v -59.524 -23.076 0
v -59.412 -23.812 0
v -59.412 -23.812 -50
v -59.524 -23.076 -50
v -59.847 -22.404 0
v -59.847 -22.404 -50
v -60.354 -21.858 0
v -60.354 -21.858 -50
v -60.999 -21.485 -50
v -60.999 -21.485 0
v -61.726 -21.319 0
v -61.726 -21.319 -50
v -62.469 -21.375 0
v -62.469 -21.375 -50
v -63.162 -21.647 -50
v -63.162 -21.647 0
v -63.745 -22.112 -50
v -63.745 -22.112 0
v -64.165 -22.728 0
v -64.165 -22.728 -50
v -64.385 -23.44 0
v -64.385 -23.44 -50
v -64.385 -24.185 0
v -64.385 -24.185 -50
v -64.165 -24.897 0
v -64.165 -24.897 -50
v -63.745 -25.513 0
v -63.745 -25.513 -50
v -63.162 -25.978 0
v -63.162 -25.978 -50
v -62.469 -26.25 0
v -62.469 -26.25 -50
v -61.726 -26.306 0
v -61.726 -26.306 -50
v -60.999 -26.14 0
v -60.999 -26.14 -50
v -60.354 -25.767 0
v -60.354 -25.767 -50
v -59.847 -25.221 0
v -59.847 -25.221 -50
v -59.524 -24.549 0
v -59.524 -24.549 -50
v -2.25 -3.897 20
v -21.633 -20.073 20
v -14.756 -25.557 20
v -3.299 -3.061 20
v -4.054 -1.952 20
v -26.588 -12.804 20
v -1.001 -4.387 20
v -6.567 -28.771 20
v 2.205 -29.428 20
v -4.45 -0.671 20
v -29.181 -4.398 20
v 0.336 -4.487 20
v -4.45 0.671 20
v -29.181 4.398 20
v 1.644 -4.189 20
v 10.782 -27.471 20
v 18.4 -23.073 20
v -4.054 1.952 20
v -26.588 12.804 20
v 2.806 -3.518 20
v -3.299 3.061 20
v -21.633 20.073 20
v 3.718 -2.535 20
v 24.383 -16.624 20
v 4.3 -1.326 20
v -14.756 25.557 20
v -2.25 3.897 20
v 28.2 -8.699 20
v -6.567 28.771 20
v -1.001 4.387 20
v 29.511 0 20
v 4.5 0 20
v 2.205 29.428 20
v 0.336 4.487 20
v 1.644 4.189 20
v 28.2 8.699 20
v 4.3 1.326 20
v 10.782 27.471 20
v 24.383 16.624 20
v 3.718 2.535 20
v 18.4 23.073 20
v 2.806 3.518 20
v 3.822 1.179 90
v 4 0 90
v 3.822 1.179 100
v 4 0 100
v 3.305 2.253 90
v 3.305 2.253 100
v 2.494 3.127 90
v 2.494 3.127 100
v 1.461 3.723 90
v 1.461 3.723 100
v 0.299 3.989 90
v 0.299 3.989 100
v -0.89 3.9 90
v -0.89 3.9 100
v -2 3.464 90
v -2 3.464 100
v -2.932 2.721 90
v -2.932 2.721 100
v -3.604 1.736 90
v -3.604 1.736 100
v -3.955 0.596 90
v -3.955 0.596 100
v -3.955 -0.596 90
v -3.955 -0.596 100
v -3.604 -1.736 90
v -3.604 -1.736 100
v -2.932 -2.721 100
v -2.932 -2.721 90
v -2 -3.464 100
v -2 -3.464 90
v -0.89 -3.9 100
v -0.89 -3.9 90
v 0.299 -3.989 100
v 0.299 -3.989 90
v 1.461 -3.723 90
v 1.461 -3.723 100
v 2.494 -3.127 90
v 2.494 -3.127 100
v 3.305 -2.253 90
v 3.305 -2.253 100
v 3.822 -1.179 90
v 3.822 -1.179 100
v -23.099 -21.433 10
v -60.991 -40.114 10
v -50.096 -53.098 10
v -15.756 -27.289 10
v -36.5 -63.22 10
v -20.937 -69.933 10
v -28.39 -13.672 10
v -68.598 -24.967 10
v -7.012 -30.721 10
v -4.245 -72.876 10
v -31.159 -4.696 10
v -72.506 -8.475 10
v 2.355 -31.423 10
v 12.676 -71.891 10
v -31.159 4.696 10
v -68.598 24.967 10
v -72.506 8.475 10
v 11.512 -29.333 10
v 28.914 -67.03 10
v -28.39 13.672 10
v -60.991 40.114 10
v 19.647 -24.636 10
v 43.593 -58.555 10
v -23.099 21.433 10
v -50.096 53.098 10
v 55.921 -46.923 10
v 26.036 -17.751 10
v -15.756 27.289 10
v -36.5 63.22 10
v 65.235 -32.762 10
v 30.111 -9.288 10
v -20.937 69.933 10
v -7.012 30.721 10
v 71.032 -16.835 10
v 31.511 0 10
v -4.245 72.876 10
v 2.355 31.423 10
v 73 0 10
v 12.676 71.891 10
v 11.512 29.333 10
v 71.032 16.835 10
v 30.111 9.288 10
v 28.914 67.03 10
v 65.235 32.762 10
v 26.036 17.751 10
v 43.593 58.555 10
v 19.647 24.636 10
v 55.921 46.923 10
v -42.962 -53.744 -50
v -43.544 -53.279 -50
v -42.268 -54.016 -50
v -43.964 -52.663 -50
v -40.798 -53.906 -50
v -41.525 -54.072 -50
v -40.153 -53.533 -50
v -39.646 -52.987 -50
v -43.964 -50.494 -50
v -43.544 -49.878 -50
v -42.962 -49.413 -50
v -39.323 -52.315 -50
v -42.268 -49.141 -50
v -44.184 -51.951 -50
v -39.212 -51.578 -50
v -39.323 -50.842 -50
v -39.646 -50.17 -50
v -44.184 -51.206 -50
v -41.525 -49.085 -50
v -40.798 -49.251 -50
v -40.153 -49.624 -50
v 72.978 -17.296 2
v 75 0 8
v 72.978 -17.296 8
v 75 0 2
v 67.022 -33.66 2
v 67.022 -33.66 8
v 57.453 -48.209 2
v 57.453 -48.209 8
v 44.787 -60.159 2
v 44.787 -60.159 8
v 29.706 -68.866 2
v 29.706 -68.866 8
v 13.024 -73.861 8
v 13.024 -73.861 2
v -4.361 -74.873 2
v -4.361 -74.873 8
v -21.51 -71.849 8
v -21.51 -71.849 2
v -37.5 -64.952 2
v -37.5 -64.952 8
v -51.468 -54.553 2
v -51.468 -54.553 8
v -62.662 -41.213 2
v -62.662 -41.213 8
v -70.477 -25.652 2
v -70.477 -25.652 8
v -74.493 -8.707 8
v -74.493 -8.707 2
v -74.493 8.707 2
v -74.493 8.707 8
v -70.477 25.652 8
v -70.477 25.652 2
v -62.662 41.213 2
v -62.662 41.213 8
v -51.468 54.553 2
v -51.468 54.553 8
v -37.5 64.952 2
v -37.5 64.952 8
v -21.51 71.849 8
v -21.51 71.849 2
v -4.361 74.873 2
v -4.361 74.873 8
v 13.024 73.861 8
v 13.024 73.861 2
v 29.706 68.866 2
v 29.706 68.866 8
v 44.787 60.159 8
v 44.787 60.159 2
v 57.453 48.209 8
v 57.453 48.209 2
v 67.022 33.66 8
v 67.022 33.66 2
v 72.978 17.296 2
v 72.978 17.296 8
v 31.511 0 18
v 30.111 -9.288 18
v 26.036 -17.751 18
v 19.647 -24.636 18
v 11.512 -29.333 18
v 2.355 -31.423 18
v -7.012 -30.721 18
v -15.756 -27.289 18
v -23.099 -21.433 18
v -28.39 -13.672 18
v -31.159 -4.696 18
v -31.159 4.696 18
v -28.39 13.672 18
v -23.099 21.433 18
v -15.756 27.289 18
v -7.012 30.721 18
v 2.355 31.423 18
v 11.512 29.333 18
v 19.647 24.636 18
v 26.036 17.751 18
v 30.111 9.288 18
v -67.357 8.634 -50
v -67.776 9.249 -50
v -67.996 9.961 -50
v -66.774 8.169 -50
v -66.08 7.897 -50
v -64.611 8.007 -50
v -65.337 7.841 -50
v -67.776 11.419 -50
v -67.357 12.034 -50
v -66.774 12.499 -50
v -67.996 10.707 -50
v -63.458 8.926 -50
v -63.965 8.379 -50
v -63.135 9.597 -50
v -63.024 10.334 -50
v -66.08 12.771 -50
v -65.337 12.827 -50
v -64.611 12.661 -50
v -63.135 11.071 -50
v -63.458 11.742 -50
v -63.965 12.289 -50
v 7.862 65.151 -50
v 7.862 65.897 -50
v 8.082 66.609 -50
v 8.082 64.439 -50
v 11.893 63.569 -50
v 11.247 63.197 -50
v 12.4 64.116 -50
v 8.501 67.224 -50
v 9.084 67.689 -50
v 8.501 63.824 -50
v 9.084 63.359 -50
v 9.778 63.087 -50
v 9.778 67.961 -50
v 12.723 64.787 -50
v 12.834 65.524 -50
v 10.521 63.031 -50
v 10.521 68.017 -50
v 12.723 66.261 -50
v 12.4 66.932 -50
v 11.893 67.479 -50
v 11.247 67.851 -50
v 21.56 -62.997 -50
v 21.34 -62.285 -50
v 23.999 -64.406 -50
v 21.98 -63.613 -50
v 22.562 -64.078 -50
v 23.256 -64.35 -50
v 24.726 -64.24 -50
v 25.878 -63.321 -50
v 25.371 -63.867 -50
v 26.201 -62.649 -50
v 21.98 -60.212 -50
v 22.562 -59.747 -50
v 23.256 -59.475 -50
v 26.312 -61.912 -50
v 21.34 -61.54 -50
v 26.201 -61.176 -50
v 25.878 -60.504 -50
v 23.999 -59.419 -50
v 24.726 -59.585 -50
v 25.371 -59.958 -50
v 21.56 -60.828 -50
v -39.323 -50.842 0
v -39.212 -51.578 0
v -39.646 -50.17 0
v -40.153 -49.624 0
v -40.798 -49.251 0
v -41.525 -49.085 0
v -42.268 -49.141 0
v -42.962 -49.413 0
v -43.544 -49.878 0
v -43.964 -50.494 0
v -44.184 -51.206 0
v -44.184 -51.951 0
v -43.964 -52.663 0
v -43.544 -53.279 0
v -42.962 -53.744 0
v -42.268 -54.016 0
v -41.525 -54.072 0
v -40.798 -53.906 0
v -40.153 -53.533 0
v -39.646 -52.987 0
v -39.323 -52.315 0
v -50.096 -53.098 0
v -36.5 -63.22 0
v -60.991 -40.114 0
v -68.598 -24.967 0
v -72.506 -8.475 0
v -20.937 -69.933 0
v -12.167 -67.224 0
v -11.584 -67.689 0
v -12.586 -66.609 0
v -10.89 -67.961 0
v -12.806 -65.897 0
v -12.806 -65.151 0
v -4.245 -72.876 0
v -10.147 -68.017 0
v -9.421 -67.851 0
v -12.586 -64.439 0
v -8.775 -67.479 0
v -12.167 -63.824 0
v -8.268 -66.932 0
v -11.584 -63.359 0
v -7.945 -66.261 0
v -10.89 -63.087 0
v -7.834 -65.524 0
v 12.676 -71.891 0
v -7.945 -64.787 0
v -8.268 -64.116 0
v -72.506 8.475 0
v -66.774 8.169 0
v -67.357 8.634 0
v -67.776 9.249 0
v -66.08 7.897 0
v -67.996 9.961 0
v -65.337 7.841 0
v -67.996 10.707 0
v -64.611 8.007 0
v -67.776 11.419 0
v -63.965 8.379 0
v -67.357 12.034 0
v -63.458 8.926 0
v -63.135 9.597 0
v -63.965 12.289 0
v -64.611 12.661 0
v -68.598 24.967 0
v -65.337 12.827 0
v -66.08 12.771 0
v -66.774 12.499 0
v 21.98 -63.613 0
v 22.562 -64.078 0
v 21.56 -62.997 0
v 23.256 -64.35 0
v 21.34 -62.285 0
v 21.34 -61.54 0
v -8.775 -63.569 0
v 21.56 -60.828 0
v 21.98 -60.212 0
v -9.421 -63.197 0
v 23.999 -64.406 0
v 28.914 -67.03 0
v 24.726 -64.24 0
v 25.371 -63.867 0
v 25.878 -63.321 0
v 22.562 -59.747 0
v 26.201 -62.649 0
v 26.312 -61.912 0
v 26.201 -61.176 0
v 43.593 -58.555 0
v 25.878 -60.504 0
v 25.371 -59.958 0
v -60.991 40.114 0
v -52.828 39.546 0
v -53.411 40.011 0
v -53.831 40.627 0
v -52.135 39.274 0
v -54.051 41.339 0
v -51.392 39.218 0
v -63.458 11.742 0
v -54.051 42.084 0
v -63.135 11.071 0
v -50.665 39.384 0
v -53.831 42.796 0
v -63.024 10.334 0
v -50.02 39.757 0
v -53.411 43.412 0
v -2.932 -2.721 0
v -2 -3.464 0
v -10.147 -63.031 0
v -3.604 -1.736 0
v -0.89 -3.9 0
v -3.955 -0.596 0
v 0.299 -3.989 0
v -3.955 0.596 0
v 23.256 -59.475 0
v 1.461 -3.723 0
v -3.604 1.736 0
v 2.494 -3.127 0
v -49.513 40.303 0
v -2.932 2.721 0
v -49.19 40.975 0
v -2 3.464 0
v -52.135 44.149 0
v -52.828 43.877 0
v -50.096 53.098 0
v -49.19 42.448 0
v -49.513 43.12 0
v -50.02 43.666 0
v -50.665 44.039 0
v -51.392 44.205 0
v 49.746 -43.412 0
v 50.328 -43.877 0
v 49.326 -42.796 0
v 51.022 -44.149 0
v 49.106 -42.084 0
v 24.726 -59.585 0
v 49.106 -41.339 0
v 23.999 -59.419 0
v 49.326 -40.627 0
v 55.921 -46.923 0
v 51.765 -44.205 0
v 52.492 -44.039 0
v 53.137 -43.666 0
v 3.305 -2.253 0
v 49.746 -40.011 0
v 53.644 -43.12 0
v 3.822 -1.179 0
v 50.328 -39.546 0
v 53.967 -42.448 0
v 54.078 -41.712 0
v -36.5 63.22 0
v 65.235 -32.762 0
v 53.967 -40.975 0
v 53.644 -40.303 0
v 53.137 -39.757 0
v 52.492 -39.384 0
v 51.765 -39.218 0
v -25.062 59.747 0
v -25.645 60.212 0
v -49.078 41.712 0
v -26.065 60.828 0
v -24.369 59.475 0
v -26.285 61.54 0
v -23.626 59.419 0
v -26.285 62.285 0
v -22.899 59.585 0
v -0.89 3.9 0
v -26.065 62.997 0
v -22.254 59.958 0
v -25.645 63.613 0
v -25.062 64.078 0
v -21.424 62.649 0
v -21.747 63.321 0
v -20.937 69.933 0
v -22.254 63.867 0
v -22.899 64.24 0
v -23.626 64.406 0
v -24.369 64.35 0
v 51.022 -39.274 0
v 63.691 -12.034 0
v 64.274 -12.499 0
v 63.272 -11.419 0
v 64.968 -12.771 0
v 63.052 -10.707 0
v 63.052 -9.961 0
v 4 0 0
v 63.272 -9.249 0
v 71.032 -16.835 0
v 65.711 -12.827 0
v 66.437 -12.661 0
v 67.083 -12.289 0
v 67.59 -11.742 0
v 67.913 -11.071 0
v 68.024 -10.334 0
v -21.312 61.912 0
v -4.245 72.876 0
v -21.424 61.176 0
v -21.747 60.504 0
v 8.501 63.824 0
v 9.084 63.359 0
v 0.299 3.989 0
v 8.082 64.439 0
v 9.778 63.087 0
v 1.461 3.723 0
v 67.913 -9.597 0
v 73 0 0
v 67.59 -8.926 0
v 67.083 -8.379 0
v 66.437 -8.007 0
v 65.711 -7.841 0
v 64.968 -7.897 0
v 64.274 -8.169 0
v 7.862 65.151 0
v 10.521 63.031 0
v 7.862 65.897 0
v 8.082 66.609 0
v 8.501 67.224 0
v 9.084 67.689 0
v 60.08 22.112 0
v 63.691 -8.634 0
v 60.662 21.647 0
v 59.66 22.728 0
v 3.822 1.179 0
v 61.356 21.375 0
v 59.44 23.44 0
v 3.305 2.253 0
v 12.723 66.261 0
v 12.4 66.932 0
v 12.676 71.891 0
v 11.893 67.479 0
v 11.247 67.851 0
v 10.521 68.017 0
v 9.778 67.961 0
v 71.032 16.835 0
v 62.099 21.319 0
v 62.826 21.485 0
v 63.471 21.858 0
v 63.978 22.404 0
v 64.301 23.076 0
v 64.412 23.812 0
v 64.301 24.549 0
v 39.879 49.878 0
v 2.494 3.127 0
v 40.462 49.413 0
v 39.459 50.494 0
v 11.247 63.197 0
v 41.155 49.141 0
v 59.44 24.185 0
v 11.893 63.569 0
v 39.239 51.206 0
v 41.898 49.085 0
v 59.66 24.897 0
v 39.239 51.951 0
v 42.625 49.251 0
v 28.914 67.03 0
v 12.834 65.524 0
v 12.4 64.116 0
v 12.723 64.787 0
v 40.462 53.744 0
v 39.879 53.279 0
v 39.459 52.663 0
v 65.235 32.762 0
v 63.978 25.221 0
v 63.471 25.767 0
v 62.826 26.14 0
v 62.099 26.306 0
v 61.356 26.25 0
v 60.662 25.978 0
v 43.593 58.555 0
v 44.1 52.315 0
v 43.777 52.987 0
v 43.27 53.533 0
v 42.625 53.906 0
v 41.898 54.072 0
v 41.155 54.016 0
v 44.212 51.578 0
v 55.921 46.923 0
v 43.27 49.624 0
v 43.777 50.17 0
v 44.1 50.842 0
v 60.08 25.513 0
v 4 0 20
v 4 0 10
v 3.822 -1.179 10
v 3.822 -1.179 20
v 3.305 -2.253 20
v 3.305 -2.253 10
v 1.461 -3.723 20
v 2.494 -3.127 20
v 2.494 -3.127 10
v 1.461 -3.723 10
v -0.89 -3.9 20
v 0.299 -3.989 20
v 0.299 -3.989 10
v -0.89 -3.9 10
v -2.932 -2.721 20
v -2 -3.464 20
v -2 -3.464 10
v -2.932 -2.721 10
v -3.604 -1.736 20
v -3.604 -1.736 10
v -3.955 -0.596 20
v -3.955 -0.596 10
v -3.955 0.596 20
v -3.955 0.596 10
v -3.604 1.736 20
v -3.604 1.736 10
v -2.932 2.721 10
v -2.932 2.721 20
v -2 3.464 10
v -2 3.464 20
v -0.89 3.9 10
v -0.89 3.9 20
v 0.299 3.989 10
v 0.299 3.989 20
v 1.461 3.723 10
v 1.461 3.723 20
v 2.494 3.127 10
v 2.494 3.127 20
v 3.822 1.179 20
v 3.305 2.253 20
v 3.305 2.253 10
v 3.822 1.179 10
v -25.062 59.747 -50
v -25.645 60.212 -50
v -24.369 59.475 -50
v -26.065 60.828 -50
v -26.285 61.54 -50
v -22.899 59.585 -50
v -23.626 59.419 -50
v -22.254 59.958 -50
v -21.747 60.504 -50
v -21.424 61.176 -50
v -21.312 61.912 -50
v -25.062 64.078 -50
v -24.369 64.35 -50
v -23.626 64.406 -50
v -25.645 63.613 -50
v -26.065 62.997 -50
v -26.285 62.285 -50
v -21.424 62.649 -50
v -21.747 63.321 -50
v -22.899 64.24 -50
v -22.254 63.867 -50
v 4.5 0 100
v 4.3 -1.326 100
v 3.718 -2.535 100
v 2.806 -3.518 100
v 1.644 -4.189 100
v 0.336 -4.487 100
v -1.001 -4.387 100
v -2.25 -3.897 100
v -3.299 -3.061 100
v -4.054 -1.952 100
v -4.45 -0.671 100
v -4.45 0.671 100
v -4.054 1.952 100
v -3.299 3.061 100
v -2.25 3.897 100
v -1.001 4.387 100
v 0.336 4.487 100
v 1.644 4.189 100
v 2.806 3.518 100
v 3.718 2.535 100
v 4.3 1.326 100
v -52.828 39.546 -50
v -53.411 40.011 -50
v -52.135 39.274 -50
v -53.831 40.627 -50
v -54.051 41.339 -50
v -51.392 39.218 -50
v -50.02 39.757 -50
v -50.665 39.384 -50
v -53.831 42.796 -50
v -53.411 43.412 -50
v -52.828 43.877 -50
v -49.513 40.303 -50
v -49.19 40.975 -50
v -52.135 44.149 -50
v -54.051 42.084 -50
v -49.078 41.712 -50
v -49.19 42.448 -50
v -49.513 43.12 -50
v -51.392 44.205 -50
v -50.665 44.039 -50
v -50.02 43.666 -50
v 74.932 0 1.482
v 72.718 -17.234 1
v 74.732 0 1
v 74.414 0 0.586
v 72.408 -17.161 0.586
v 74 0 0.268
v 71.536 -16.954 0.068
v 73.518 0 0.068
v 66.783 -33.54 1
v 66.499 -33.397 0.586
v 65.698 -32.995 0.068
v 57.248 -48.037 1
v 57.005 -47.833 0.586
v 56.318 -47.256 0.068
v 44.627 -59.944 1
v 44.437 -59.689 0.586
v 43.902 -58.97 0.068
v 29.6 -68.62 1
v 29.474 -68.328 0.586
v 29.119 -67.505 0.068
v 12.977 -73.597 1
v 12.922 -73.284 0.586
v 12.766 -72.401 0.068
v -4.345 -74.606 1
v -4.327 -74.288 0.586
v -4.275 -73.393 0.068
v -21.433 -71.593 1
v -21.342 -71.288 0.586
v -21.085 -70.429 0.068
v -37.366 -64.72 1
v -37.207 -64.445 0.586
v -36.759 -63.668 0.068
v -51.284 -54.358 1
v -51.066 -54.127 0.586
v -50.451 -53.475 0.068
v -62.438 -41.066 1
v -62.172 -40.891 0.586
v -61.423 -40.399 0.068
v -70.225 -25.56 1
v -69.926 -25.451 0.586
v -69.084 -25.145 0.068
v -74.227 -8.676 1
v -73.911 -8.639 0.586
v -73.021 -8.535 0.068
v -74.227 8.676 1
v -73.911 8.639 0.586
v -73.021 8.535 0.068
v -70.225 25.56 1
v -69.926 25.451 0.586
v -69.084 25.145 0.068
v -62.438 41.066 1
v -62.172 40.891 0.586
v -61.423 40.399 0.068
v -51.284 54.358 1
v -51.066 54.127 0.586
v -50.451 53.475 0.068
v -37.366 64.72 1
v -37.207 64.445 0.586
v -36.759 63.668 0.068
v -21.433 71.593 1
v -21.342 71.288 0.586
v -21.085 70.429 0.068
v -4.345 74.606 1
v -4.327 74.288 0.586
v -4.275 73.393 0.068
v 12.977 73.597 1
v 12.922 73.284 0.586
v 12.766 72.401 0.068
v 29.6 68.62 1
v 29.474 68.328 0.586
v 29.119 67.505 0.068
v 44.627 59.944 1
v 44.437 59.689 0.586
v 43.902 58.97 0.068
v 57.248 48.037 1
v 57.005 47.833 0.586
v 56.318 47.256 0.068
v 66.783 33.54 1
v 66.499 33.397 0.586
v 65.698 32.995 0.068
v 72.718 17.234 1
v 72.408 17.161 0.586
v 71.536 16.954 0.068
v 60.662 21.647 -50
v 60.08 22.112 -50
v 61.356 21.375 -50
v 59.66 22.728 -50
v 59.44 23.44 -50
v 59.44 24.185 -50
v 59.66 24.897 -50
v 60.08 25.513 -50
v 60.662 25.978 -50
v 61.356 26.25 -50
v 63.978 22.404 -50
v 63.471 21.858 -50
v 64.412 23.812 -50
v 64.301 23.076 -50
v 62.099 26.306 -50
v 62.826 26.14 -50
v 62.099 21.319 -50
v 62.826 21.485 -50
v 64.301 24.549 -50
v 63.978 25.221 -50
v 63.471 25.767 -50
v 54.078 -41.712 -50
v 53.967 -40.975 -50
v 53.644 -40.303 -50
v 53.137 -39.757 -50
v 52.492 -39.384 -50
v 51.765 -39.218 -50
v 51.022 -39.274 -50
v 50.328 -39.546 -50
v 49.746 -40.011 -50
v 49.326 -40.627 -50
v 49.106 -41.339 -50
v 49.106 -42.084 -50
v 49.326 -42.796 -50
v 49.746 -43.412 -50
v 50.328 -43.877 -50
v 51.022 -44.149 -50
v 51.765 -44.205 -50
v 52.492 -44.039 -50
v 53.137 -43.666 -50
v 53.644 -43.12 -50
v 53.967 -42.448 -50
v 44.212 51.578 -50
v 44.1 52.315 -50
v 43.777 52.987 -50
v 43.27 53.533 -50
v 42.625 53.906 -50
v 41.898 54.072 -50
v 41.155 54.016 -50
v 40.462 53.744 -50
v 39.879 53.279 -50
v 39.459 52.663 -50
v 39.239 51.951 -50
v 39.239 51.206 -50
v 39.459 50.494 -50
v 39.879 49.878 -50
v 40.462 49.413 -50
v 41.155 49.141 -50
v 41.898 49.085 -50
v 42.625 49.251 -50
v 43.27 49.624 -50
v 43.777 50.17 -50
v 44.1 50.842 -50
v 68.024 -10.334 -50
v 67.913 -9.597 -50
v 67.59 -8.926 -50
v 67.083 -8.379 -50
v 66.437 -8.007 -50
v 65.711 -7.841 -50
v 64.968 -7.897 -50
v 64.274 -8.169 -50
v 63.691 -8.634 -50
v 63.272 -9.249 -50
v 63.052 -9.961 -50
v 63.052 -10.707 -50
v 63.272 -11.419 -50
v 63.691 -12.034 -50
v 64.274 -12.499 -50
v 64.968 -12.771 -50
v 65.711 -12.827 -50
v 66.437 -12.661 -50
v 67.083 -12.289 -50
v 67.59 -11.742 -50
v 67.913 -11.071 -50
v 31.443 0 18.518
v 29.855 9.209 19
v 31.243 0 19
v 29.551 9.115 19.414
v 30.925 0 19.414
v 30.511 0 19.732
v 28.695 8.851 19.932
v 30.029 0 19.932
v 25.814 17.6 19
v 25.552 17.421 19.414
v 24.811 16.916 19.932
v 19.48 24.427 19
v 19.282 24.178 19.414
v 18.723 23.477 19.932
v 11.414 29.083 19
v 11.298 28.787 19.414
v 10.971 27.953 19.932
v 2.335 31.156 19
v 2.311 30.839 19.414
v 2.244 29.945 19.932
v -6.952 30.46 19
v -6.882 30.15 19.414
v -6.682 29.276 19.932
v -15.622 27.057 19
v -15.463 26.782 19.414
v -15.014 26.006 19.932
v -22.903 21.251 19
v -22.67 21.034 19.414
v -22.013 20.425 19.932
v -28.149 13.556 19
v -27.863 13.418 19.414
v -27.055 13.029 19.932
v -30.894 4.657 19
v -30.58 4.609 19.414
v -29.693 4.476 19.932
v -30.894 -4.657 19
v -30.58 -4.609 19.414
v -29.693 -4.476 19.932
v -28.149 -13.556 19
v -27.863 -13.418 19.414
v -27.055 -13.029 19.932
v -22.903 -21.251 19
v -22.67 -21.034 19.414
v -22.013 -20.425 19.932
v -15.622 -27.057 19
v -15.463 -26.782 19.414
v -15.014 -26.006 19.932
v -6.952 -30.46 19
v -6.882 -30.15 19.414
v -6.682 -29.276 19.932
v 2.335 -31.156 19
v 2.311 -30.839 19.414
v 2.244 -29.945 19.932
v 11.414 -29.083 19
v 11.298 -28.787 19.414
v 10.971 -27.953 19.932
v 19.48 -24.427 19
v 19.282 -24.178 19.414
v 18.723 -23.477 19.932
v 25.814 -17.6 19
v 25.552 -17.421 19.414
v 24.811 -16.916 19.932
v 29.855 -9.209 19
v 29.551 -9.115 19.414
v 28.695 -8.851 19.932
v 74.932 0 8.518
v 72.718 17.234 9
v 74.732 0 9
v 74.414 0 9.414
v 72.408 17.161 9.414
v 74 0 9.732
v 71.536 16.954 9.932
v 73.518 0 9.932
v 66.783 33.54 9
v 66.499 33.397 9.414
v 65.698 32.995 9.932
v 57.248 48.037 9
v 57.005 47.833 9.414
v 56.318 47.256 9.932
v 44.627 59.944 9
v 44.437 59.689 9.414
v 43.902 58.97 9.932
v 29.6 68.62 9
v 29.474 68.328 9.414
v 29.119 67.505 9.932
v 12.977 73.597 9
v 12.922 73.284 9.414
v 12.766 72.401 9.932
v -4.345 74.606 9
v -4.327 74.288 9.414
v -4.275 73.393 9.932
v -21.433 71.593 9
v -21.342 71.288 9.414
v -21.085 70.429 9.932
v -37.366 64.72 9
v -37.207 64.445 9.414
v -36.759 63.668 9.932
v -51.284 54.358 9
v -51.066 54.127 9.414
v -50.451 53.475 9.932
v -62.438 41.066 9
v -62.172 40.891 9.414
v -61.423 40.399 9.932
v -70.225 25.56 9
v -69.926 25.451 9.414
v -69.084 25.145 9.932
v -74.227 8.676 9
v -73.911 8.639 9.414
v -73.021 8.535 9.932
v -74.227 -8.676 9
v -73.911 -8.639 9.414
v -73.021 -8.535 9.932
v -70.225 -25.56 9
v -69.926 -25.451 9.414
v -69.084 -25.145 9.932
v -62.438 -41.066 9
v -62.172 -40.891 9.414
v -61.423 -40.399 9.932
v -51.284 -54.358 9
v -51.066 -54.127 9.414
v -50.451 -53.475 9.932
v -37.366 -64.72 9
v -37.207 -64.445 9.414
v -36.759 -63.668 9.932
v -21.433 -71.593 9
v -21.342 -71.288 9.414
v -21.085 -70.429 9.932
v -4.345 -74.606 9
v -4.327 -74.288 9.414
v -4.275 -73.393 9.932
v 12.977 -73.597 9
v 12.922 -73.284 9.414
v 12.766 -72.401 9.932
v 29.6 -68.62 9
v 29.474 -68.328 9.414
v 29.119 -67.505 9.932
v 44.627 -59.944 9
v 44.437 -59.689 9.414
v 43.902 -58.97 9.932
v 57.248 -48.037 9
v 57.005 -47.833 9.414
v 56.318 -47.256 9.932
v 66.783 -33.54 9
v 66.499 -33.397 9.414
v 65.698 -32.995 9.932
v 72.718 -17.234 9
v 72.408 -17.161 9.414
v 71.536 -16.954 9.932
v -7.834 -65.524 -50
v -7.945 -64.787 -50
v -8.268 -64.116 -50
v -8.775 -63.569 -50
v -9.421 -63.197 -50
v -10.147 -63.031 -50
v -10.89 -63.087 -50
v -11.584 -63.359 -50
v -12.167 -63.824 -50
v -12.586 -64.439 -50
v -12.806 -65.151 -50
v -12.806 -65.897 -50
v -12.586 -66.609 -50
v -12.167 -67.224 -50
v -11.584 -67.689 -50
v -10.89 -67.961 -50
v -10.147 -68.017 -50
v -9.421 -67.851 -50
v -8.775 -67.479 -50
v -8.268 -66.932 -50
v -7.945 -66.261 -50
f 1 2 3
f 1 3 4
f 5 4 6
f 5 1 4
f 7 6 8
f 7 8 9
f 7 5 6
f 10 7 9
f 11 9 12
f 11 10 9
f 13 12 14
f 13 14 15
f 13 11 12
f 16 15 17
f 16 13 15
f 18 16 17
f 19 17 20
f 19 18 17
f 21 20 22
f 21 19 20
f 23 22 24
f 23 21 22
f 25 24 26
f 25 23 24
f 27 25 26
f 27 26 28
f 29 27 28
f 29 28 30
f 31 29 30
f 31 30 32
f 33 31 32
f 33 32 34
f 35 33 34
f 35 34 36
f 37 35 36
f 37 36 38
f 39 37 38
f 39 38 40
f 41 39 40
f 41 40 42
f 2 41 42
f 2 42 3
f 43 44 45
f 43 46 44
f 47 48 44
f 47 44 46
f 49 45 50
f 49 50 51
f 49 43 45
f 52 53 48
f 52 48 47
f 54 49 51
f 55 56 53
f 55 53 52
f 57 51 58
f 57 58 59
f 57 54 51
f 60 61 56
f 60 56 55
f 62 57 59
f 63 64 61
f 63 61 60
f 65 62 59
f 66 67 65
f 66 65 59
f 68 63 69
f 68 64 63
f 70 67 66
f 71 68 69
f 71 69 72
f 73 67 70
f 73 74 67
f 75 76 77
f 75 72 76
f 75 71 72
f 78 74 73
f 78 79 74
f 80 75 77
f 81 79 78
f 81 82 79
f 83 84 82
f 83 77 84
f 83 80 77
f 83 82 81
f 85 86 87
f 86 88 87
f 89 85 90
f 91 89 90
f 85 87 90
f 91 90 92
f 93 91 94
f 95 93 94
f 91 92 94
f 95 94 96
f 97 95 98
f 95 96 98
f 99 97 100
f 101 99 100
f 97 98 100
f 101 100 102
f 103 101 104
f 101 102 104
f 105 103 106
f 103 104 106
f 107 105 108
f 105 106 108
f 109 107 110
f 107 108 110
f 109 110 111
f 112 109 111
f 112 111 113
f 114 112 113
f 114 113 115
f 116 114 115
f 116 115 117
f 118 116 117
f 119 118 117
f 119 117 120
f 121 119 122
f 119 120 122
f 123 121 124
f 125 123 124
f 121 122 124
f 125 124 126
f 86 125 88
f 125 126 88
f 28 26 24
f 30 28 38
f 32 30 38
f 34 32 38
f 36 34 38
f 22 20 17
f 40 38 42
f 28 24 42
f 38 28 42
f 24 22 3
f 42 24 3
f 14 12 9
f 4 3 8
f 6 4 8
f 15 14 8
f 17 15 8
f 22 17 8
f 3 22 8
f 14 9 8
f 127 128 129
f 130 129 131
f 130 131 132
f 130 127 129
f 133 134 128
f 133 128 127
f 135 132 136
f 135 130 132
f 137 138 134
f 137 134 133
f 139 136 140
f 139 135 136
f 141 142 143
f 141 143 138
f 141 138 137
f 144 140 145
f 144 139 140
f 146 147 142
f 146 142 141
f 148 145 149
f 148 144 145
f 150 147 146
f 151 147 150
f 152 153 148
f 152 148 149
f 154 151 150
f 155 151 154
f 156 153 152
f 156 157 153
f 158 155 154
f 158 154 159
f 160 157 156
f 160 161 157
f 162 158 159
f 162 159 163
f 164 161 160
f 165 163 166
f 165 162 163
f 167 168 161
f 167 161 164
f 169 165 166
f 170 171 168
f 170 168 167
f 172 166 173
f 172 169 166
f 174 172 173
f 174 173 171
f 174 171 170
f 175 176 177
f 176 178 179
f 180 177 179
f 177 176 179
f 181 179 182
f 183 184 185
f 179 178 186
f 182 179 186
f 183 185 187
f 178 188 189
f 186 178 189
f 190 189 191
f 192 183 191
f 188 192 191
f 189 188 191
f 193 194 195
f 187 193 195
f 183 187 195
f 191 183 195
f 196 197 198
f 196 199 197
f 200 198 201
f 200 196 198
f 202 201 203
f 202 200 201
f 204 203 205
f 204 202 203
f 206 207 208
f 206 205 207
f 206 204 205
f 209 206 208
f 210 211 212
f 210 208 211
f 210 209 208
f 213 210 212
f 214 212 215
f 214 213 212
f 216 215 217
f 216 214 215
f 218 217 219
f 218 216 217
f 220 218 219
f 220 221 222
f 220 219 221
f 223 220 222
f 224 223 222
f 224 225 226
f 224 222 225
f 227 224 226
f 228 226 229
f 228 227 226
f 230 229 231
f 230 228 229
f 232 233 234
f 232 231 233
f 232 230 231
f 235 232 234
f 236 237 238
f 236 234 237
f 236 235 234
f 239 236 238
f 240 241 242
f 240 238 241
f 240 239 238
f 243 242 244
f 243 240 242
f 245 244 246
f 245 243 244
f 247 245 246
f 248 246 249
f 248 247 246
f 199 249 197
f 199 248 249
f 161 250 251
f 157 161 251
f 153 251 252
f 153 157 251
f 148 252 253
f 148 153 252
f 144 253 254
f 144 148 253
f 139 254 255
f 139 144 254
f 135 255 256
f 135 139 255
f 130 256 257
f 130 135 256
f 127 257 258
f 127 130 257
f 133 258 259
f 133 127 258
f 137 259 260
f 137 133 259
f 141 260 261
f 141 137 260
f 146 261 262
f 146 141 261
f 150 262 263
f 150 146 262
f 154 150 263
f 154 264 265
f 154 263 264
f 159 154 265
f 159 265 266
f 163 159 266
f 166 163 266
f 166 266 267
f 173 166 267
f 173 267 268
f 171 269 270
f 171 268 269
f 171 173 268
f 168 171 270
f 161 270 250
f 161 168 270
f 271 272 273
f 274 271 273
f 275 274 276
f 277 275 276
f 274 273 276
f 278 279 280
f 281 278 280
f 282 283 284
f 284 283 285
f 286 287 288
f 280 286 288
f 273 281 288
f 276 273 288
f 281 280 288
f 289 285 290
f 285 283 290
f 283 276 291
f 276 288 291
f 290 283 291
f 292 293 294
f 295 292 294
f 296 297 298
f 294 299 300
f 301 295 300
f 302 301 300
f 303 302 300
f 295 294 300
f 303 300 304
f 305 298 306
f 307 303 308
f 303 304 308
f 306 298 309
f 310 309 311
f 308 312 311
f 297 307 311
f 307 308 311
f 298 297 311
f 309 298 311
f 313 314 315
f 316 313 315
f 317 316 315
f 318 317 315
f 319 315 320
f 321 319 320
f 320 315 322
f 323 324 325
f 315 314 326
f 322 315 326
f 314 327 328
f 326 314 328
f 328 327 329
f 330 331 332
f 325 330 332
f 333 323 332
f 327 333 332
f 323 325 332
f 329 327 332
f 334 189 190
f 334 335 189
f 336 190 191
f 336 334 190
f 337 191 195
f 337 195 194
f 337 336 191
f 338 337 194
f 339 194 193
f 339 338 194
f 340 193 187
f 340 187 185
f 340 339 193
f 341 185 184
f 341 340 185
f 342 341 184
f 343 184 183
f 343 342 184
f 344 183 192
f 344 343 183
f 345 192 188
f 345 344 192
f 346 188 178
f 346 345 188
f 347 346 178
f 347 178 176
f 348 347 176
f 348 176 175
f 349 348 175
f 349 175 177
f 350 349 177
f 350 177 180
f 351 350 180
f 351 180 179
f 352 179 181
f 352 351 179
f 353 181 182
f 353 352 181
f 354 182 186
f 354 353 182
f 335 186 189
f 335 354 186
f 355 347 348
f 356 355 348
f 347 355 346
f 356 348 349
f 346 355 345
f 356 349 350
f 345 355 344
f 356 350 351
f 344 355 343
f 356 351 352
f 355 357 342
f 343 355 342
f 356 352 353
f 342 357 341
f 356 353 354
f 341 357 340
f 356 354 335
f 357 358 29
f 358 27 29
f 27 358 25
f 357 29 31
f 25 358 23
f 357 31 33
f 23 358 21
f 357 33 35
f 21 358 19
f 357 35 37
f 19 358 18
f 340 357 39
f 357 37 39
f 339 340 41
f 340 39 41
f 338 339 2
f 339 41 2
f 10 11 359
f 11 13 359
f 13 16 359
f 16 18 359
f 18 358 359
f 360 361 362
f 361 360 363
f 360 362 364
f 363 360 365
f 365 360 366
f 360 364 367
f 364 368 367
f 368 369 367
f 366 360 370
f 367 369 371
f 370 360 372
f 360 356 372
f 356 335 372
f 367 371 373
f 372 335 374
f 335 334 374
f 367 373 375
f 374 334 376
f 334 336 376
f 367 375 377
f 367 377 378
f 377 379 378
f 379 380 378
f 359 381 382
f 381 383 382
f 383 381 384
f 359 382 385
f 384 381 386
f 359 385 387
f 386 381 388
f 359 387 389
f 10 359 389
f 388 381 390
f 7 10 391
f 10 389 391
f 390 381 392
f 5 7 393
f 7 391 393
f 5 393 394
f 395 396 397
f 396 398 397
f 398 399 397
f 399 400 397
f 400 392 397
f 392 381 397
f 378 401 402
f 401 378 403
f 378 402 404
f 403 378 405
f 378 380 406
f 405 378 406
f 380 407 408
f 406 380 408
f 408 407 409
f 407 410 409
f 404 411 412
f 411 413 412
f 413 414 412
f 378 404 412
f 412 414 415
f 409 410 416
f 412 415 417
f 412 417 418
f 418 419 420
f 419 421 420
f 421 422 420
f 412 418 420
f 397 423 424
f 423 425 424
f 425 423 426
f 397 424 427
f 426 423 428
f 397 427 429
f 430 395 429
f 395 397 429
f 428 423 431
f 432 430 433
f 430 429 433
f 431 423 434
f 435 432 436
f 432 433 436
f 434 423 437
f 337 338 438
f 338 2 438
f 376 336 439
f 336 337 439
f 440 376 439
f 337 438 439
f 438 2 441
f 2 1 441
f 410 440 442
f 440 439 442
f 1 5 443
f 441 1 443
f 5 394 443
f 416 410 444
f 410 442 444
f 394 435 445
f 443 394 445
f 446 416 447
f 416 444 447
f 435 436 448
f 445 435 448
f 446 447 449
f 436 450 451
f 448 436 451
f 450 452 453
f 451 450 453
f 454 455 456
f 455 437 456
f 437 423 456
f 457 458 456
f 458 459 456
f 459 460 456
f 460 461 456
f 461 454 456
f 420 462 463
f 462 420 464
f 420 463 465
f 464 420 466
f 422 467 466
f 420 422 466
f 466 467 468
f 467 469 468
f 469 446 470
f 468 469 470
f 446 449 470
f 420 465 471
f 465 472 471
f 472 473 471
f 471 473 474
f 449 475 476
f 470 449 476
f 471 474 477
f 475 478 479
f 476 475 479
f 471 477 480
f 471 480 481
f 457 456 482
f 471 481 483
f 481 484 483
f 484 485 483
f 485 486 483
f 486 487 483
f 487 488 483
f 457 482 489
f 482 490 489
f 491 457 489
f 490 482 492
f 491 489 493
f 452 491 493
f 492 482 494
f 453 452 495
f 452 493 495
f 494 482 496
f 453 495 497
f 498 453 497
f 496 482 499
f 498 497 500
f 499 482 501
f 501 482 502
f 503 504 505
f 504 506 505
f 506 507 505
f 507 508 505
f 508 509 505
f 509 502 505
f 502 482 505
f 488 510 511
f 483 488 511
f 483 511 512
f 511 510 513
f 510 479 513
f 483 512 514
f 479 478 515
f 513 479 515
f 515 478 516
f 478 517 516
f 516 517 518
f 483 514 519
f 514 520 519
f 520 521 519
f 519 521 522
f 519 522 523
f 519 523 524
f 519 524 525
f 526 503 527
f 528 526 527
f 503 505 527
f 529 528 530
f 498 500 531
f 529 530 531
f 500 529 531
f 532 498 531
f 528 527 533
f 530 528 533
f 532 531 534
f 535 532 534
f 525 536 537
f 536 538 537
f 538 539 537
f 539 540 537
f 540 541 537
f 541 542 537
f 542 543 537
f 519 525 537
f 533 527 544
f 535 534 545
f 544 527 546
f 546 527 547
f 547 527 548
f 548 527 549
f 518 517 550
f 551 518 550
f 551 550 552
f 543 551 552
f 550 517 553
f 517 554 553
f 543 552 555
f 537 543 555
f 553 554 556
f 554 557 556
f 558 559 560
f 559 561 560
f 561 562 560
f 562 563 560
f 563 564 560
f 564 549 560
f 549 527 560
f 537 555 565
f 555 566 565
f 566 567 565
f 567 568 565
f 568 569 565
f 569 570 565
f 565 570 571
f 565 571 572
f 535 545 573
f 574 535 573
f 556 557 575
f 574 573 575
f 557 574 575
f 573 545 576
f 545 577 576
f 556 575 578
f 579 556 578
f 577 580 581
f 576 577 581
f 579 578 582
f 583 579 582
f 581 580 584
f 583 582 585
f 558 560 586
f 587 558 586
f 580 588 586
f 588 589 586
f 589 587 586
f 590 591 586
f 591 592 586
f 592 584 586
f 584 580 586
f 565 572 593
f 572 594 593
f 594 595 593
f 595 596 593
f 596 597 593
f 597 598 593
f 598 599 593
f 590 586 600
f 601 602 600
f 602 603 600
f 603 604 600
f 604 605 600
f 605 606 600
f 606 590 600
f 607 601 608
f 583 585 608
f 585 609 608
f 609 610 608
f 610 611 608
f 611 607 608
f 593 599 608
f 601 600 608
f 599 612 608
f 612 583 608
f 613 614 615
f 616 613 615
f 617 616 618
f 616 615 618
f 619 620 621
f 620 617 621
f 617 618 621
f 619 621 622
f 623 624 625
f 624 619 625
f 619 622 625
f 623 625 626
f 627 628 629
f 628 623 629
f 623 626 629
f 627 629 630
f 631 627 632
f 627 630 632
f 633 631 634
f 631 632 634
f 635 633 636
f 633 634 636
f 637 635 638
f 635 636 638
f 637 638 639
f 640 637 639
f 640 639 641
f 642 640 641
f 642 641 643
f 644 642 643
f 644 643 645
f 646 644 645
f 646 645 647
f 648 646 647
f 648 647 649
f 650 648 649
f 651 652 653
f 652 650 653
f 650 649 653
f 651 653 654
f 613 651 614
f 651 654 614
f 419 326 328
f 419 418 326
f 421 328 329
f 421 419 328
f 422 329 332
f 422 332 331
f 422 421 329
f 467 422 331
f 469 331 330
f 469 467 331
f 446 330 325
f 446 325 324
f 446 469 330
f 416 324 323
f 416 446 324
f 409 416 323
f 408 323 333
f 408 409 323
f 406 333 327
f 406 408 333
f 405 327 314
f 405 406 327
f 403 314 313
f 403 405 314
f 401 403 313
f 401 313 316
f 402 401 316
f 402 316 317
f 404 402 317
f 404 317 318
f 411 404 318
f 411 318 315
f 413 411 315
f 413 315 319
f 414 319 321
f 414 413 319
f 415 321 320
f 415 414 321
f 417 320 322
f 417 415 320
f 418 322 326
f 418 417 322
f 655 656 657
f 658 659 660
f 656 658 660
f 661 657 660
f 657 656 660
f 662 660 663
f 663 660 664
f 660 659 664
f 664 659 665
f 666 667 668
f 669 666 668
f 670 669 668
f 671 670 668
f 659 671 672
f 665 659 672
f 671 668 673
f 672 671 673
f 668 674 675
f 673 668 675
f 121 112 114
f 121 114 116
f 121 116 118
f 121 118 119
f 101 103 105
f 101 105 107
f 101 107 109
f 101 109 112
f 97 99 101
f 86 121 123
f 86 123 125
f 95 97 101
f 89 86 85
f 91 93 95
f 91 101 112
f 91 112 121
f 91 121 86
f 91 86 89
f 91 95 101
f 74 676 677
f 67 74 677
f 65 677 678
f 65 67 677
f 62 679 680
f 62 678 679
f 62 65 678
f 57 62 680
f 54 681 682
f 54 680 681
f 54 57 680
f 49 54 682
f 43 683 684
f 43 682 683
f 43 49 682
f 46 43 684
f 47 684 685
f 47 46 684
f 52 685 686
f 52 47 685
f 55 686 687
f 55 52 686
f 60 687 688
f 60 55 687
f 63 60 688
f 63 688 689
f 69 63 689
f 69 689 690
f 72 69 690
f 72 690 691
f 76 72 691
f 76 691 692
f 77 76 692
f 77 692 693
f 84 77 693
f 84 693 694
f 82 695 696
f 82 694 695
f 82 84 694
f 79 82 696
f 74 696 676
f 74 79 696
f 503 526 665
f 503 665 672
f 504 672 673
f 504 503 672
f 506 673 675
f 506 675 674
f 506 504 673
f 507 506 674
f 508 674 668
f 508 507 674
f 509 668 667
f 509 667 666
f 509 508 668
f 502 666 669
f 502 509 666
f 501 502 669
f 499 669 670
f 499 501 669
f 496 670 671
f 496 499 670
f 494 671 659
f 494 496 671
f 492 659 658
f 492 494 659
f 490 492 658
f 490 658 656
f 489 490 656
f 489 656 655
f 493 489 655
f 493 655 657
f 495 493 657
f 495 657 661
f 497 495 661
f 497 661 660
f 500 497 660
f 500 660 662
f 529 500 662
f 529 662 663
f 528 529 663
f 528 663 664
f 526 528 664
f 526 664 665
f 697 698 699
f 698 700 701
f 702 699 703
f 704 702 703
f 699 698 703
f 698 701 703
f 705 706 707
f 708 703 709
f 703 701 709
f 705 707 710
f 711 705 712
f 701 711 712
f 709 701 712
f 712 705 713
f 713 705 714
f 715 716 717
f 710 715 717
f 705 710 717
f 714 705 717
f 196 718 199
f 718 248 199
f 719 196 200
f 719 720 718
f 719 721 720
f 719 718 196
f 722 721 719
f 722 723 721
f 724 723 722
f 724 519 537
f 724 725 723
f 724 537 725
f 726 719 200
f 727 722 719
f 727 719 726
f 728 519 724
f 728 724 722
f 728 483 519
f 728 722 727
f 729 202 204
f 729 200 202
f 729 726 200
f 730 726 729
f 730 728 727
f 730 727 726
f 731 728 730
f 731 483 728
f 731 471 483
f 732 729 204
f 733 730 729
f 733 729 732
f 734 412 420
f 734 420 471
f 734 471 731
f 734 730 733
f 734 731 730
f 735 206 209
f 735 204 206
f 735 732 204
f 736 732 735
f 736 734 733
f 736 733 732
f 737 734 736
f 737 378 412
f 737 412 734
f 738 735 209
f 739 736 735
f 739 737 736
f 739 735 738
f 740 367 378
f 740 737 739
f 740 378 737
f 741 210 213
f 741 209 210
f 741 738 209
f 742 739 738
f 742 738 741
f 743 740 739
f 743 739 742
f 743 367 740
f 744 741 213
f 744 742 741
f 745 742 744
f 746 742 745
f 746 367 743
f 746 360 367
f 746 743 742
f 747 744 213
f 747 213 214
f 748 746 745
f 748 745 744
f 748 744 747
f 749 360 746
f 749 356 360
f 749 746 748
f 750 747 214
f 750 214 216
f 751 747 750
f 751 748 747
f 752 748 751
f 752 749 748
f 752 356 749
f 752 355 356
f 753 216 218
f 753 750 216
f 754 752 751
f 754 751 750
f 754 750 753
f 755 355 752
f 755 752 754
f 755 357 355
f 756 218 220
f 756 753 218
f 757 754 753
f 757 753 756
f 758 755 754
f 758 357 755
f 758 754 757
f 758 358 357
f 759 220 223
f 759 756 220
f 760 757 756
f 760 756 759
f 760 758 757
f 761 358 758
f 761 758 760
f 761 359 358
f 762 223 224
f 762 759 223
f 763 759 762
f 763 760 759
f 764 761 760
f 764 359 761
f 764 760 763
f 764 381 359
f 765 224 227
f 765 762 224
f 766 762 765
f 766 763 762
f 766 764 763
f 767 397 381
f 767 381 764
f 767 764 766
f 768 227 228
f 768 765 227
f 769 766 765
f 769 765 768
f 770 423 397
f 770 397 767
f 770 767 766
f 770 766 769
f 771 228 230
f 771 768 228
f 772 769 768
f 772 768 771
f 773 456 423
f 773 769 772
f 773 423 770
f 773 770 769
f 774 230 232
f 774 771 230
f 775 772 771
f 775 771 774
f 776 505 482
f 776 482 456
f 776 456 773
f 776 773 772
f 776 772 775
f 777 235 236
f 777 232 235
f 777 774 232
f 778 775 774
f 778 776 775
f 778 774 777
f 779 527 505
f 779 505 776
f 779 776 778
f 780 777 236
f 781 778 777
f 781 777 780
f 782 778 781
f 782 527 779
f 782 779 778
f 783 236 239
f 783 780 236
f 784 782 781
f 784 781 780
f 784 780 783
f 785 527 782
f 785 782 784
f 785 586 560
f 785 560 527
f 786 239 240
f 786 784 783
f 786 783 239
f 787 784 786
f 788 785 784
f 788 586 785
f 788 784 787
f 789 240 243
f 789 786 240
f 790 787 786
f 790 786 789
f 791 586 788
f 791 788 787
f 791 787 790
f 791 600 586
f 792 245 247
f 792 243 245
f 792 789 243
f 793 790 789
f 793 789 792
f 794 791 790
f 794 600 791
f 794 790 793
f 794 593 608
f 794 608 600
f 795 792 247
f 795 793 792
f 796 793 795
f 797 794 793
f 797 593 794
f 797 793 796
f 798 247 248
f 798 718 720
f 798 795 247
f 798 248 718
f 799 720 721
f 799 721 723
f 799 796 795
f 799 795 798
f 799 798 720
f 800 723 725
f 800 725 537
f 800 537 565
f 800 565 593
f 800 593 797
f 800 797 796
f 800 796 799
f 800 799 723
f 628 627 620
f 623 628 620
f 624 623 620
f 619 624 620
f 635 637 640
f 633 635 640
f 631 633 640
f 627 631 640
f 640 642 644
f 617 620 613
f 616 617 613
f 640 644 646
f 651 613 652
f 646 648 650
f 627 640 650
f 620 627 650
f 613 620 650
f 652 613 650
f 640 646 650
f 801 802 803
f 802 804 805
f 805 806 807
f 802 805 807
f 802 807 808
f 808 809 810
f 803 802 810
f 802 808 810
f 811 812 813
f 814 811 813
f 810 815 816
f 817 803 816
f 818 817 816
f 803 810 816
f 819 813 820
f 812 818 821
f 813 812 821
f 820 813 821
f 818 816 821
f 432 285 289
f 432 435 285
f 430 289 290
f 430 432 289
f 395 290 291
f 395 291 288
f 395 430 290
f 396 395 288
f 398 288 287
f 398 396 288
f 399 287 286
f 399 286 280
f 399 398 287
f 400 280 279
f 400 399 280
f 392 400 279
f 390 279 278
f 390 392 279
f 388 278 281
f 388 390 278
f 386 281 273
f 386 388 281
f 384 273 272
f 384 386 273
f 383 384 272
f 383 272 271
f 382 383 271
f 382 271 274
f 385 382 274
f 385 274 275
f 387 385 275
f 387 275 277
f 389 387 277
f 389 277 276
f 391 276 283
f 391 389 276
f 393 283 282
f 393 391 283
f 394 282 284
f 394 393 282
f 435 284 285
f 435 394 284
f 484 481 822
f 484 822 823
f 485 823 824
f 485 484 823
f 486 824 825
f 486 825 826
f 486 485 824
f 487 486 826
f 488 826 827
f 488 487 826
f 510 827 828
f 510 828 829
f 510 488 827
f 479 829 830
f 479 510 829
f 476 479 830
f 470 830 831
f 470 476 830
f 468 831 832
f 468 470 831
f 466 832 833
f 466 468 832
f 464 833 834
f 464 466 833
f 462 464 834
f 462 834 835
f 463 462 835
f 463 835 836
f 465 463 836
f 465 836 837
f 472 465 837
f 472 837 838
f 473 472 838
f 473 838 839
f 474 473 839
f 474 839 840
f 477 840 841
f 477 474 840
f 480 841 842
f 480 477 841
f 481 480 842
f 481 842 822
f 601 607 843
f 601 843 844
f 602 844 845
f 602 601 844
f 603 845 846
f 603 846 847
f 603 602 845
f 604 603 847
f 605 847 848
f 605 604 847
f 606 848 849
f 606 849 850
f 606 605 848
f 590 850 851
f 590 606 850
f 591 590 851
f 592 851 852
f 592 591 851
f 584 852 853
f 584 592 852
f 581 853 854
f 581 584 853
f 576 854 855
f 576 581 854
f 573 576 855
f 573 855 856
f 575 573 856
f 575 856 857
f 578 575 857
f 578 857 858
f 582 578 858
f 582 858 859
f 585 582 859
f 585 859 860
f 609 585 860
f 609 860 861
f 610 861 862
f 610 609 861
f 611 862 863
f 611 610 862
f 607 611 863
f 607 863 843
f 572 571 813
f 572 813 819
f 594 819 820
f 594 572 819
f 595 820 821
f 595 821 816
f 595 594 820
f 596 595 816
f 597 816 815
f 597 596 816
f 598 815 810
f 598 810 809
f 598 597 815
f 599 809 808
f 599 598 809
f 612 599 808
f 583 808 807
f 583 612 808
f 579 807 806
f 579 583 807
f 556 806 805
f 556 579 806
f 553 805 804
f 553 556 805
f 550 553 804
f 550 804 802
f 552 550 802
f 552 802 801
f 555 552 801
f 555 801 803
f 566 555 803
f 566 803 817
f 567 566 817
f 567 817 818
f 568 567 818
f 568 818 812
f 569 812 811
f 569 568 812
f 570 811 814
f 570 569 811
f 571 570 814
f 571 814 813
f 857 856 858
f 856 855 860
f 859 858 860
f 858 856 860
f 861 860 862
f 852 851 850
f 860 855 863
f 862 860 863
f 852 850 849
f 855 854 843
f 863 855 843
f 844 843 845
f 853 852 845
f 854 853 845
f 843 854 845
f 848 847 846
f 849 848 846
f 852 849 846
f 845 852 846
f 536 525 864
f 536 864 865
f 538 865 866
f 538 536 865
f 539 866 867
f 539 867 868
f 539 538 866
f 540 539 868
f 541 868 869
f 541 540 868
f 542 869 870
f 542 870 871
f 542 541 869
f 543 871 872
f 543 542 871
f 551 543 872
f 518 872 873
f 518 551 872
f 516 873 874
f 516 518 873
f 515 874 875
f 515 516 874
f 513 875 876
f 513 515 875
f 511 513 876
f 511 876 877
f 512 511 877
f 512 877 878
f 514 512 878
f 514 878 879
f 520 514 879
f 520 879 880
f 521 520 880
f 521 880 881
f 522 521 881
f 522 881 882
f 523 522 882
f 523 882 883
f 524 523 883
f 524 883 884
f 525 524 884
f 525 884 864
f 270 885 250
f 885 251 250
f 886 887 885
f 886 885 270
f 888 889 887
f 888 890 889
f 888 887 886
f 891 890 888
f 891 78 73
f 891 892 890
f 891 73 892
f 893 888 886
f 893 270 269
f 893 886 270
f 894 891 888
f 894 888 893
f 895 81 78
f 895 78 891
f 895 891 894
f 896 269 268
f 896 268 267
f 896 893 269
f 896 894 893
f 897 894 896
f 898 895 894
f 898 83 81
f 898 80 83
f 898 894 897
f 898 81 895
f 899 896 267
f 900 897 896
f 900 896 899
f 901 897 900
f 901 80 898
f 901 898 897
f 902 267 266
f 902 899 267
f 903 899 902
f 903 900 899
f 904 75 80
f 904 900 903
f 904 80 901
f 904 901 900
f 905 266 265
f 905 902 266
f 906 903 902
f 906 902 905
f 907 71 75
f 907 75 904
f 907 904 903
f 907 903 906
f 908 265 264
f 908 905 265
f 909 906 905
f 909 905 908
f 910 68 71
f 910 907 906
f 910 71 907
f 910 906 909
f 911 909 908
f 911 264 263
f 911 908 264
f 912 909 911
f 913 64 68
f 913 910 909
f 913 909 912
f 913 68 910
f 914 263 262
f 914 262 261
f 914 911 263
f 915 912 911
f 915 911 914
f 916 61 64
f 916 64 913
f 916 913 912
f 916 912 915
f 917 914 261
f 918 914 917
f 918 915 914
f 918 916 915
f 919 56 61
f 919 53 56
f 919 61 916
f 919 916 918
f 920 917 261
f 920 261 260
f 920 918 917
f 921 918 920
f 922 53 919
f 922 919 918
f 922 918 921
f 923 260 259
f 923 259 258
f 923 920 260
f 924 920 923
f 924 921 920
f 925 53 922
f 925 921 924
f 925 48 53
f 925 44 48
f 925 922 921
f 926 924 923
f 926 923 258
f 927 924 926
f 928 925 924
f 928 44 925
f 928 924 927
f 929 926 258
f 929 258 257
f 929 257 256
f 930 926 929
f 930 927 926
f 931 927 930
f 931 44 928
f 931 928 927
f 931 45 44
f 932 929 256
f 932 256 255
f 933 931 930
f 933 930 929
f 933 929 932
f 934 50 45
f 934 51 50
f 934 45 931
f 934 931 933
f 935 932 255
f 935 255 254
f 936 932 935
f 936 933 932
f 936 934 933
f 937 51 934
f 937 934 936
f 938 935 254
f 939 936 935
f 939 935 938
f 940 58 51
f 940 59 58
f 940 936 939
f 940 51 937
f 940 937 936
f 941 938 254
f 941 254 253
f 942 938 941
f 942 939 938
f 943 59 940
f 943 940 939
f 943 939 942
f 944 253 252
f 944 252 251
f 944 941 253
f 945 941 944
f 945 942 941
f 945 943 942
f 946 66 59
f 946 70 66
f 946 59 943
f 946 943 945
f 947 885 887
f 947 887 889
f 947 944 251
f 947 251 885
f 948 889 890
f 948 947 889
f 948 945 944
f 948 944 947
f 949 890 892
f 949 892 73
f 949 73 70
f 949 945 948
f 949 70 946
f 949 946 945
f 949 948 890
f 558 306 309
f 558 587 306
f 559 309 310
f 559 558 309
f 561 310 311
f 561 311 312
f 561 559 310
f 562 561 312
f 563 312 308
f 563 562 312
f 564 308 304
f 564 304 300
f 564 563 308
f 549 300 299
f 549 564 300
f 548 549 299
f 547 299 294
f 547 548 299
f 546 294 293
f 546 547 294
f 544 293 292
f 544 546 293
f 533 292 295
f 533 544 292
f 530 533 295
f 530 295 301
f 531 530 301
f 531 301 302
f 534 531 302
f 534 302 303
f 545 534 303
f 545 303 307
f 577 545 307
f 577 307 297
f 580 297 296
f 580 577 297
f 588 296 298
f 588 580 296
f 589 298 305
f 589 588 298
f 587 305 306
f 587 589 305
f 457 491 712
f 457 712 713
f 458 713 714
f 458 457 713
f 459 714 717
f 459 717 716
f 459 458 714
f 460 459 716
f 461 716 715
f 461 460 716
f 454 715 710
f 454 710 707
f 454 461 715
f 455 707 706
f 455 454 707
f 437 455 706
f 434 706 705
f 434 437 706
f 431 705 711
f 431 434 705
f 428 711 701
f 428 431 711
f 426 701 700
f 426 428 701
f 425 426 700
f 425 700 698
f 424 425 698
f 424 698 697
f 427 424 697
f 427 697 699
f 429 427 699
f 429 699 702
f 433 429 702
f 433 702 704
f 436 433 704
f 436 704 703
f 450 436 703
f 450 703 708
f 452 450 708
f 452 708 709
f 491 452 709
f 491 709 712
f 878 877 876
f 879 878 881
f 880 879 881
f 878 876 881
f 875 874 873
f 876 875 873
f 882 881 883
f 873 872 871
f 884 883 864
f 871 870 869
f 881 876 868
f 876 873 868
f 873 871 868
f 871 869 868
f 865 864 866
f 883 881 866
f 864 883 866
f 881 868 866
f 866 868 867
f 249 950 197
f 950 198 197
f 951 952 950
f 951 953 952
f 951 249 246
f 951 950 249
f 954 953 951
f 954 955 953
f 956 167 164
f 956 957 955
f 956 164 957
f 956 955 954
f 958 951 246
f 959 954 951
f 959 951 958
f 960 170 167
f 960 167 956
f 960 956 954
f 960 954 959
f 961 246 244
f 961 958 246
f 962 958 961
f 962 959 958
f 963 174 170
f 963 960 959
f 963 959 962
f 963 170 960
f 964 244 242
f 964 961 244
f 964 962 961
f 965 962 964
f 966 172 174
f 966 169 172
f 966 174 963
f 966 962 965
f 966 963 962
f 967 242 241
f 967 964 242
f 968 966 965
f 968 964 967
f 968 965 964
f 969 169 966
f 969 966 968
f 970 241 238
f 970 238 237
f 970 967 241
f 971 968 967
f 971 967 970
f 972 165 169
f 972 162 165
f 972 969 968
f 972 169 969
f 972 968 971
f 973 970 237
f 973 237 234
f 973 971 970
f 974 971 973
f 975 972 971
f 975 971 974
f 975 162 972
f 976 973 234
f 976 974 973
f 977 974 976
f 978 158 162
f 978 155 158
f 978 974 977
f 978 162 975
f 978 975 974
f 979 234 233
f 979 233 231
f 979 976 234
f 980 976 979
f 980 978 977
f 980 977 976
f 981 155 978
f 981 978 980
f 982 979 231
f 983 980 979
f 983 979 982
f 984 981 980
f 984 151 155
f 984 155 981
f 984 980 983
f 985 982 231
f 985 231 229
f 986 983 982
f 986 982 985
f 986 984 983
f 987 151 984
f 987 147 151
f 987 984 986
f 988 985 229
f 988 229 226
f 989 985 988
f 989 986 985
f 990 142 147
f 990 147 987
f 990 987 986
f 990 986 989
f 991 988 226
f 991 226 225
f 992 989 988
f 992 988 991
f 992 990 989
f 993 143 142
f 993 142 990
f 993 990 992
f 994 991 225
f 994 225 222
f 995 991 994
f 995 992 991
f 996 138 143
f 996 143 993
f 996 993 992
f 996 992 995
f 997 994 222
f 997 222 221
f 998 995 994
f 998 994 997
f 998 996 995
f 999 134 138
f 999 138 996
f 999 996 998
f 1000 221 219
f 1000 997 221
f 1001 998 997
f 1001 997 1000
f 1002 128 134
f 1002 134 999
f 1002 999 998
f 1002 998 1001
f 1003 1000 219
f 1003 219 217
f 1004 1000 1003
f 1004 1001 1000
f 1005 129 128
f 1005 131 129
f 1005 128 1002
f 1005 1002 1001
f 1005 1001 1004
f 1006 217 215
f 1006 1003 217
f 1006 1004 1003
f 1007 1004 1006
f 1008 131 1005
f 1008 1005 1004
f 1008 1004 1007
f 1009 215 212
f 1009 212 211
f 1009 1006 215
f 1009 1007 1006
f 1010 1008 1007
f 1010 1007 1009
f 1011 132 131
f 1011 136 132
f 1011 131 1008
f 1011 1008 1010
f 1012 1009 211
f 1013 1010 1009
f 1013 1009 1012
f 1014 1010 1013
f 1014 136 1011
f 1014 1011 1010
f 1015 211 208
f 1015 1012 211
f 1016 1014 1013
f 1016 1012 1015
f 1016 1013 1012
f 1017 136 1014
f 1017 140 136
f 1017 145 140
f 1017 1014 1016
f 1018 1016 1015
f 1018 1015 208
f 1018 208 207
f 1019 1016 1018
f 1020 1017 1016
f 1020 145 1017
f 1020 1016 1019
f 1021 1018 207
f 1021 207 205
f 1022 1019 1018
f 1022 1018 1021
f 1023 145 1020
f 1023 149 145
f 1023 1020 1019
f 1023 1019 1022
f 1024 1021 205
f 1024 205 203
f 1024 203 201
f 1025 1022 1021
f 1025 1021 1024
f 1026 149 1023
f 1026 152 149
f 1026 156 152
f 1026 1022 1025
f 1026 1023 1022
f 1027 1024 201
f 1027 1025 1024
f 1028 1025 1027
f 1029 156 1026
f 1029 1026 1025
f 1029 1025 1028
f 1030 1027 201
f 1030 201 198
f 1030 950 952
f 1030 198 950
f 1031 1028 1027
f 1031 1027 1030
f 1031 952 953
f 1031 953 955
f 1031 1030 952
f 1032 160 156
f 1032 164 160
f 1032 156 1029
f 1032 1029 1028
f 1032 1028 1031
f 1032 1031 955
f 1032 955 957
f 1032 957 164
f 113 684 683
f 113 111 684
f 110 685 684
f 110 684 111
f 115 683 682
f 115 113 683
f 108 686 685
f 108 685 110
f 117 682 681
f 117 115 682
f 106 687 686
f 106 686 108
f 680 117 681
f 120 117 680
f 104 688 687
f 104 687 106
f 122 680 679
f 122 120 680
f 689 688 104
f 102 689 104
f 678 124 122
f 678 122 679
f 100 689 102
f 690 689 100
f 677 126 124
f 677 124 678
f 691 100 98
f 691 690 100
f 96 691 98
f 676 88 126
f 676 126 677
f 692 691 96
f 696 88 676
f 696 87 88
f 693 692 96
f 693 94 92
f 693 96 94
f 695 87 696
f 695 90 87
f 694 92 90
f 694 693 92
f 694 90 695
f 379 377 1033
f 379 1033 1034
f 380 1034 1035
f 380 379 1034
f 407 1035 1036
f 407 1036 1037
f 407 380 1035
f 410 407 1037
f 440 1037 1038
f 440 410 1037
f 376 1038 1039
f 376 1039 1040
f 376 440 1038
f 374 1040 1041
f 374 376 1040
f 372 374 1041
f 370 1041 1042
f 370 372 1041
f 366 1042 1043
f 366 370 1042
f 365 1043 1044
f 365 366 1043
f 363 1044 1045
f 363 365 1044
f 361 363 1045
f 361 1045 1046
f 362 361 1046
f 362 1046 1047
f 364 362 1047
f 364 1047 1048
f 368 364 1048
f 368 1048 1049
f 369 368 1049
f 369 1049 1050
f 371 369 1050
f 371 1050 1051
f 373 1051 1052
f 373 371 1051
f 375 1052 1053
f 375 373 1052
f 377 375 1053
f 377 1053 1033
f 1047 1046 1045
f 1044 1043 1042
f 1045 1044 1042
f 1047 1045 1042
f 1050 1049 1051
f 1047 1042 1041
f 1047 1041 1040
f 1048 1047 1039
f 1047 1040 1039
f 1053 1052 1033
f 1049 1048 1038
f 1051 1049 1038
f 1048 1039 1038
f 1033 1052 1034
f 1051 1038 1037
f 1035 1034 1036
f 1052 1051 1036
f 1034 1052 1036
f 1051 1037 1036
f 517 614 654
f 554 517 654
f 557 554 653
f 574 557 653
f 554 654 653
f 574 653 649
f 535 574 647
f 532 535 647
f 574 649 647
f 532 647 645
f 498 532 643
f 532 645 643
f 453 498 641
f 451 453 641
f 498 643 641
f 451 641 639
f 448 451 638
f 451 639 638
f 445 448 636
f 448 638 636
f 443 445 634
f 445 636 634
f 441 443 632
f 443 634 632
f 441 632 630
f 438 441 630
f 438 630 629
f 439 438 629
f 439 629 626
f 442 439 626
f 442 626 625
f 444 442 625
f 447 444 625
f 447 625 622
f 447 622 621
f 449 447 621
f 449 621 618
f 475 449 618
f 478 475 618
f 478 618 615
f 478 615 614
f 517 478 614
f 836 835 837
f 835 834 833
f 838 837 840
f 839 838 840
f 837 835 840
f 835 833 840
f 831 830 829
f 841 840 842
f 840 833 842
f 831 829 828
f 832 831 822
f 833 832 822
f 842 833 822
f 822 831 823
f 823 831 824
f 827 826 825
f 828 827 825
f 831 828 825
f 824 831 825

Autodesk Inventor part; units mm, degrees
ref_plane "YZ Plane" through (0, 0, 0) normal (1, 0, 0) x (0, 1, 0)
ref_plane "XZ Plane" through (0, 0, 0) normal (0, 1, 0) x (-1, 0, 0)
ref_plane "XY Plane" through (0, 0, 0) normal (0, 0, 1) x (1, 0, 0)
sketch "Sketch2" plane through (0, 0, 0) normal (0, 0, 1) x (1, 0, 0)
  circle A0 centre (0, 0) radius 75
  dimension "d0" = 150
extrude "Extrusion1" add sketch "Sketch2" along normal blind 10
fillet "Fillet1" radius 2 1 edges at (-75, 0, 10)
fillet "Fillet2" radius 2 1 edges at (-75, 0, 0)
sketch "Sketch24" plane through (0, 0, 0) normal (1, 0, 0) x (0, 1, 0)
  line L0 (10, 0) -> (-10, 0) projected
  point P0 (0, 0)
sketch "Sketch25" plane through (0, 0, 0) normal (0, 0, 1) x (1, 0, 0)
  circle A0 centre (0, 0) radius 73 projected
  circle A1 centre (23.8125, -61.9125) radius 2.5
  circle A2 centre (51.5785, -41.7115) radius 2.5
  circle A3 centre (65.524, -10.334) radius 2.5
  circle A4 centre (61.9125, 23.8125) radius 2.5
  circle A5 centre (41.7115, 51.5785) radius 2.5
  circle A6 centre (10.334, 65.524) radius 2.5
  circle A7 centre (-23.8125, 61.9125) radius 2.5
  circle A8 centre (-51.5785, 41.7115) radius 2.5
  circle A9 centre (-65.524, 10.334) radius 2.5
  circle A10 centre (-61.9125, -23.8125) radius 2.5
  circle A11 centre (-41.7115, -51.5785) radius 2.5
  circle A12 centre (-10.334, -65.524) radius 2.5
  circle A13 centre (0, 0) radius 10 projected
  circle A14 centre (0, 0) radius 10 projected
  dimension "d104" = 5
  dimension "d107" = 360
sketch "Sketch26" plane through (0, 0, 0) normal (0, 0, -1) x (-1, 0, 0)
  point P0 (0, 0)
extrude "Extrusion6" add sketch "Sketch25" against normal blind 50 contours A2 | A3 | A4 | A5 | A6 | A7 | A8 | A9 | A10 | A11 | A12
sketch "Sketch29" plane through (0, 0, 0) normal (0, 0, 1) x (1, 0, 0)
  circle A0 centre (23.8125, -61.9125) radius 2.5
  point P0 (0, 0)
  dimension "d111" = 5
extrude "Extrusion7" add sketch "Sketch29" against normal blind 50
sketch "Sketch30" plane through (0, 0, 0) normal (0, 0, 1) x (1, 0, 0)
  point P0 (0, 0)
sketch "Sketch31" plane through (0, 0, 0) normal (0, 0, 1) x (1, 0, 0)
  point P0 (0, 0)
sketch "Sketch32" plane through (0, 0, 10) normal (0, 0, 1) x (1, 0, 0)
  circle A0 centre (0, 0) radius 4
  dimension "d114" = 8
extrude "Extrusion8" cut sketch "Sketch32" against normal through all both and the other way through all
sketch "Sketch33" plane through (0, 0, 10) normal (0, 0, 1) x (1, 0, 0)
  circle A0 centre (0, 0) radius 4 projected
  circle A1 centre (0, 0) radius 31.511
extrude "Extrusion9" add sketch "Sketch33" along normal blind 10
fillet "Fillet3" radius 2 1 edges at (-31.511, 0, 20)
sketch "Sketch34" plane through (0, 0, 20) normal (0, 0, 1) x (1, 0, 0)
  circle A0 centre (0, 0) radius 4 projected
  circle A1 centre (0, 0) radius 4.5
  dimension "d120" = 9
extrude "Extrusion10" add sketch "Sketch34" along normal blind 80 contours A0 | A1
sketch "Sketch35" plane through (0, 0, 100) normal (0, 0, 1) x (1, 0, 0)
  circle A0 centre (0, 0) radius 4 projected
  circle A1 centre (0, 0) radius 4
  dimension "d123" = 8
extrude "Extrusion11" cut sketch "Sketch35" against normal blind 10
properties part number "updated_base"
